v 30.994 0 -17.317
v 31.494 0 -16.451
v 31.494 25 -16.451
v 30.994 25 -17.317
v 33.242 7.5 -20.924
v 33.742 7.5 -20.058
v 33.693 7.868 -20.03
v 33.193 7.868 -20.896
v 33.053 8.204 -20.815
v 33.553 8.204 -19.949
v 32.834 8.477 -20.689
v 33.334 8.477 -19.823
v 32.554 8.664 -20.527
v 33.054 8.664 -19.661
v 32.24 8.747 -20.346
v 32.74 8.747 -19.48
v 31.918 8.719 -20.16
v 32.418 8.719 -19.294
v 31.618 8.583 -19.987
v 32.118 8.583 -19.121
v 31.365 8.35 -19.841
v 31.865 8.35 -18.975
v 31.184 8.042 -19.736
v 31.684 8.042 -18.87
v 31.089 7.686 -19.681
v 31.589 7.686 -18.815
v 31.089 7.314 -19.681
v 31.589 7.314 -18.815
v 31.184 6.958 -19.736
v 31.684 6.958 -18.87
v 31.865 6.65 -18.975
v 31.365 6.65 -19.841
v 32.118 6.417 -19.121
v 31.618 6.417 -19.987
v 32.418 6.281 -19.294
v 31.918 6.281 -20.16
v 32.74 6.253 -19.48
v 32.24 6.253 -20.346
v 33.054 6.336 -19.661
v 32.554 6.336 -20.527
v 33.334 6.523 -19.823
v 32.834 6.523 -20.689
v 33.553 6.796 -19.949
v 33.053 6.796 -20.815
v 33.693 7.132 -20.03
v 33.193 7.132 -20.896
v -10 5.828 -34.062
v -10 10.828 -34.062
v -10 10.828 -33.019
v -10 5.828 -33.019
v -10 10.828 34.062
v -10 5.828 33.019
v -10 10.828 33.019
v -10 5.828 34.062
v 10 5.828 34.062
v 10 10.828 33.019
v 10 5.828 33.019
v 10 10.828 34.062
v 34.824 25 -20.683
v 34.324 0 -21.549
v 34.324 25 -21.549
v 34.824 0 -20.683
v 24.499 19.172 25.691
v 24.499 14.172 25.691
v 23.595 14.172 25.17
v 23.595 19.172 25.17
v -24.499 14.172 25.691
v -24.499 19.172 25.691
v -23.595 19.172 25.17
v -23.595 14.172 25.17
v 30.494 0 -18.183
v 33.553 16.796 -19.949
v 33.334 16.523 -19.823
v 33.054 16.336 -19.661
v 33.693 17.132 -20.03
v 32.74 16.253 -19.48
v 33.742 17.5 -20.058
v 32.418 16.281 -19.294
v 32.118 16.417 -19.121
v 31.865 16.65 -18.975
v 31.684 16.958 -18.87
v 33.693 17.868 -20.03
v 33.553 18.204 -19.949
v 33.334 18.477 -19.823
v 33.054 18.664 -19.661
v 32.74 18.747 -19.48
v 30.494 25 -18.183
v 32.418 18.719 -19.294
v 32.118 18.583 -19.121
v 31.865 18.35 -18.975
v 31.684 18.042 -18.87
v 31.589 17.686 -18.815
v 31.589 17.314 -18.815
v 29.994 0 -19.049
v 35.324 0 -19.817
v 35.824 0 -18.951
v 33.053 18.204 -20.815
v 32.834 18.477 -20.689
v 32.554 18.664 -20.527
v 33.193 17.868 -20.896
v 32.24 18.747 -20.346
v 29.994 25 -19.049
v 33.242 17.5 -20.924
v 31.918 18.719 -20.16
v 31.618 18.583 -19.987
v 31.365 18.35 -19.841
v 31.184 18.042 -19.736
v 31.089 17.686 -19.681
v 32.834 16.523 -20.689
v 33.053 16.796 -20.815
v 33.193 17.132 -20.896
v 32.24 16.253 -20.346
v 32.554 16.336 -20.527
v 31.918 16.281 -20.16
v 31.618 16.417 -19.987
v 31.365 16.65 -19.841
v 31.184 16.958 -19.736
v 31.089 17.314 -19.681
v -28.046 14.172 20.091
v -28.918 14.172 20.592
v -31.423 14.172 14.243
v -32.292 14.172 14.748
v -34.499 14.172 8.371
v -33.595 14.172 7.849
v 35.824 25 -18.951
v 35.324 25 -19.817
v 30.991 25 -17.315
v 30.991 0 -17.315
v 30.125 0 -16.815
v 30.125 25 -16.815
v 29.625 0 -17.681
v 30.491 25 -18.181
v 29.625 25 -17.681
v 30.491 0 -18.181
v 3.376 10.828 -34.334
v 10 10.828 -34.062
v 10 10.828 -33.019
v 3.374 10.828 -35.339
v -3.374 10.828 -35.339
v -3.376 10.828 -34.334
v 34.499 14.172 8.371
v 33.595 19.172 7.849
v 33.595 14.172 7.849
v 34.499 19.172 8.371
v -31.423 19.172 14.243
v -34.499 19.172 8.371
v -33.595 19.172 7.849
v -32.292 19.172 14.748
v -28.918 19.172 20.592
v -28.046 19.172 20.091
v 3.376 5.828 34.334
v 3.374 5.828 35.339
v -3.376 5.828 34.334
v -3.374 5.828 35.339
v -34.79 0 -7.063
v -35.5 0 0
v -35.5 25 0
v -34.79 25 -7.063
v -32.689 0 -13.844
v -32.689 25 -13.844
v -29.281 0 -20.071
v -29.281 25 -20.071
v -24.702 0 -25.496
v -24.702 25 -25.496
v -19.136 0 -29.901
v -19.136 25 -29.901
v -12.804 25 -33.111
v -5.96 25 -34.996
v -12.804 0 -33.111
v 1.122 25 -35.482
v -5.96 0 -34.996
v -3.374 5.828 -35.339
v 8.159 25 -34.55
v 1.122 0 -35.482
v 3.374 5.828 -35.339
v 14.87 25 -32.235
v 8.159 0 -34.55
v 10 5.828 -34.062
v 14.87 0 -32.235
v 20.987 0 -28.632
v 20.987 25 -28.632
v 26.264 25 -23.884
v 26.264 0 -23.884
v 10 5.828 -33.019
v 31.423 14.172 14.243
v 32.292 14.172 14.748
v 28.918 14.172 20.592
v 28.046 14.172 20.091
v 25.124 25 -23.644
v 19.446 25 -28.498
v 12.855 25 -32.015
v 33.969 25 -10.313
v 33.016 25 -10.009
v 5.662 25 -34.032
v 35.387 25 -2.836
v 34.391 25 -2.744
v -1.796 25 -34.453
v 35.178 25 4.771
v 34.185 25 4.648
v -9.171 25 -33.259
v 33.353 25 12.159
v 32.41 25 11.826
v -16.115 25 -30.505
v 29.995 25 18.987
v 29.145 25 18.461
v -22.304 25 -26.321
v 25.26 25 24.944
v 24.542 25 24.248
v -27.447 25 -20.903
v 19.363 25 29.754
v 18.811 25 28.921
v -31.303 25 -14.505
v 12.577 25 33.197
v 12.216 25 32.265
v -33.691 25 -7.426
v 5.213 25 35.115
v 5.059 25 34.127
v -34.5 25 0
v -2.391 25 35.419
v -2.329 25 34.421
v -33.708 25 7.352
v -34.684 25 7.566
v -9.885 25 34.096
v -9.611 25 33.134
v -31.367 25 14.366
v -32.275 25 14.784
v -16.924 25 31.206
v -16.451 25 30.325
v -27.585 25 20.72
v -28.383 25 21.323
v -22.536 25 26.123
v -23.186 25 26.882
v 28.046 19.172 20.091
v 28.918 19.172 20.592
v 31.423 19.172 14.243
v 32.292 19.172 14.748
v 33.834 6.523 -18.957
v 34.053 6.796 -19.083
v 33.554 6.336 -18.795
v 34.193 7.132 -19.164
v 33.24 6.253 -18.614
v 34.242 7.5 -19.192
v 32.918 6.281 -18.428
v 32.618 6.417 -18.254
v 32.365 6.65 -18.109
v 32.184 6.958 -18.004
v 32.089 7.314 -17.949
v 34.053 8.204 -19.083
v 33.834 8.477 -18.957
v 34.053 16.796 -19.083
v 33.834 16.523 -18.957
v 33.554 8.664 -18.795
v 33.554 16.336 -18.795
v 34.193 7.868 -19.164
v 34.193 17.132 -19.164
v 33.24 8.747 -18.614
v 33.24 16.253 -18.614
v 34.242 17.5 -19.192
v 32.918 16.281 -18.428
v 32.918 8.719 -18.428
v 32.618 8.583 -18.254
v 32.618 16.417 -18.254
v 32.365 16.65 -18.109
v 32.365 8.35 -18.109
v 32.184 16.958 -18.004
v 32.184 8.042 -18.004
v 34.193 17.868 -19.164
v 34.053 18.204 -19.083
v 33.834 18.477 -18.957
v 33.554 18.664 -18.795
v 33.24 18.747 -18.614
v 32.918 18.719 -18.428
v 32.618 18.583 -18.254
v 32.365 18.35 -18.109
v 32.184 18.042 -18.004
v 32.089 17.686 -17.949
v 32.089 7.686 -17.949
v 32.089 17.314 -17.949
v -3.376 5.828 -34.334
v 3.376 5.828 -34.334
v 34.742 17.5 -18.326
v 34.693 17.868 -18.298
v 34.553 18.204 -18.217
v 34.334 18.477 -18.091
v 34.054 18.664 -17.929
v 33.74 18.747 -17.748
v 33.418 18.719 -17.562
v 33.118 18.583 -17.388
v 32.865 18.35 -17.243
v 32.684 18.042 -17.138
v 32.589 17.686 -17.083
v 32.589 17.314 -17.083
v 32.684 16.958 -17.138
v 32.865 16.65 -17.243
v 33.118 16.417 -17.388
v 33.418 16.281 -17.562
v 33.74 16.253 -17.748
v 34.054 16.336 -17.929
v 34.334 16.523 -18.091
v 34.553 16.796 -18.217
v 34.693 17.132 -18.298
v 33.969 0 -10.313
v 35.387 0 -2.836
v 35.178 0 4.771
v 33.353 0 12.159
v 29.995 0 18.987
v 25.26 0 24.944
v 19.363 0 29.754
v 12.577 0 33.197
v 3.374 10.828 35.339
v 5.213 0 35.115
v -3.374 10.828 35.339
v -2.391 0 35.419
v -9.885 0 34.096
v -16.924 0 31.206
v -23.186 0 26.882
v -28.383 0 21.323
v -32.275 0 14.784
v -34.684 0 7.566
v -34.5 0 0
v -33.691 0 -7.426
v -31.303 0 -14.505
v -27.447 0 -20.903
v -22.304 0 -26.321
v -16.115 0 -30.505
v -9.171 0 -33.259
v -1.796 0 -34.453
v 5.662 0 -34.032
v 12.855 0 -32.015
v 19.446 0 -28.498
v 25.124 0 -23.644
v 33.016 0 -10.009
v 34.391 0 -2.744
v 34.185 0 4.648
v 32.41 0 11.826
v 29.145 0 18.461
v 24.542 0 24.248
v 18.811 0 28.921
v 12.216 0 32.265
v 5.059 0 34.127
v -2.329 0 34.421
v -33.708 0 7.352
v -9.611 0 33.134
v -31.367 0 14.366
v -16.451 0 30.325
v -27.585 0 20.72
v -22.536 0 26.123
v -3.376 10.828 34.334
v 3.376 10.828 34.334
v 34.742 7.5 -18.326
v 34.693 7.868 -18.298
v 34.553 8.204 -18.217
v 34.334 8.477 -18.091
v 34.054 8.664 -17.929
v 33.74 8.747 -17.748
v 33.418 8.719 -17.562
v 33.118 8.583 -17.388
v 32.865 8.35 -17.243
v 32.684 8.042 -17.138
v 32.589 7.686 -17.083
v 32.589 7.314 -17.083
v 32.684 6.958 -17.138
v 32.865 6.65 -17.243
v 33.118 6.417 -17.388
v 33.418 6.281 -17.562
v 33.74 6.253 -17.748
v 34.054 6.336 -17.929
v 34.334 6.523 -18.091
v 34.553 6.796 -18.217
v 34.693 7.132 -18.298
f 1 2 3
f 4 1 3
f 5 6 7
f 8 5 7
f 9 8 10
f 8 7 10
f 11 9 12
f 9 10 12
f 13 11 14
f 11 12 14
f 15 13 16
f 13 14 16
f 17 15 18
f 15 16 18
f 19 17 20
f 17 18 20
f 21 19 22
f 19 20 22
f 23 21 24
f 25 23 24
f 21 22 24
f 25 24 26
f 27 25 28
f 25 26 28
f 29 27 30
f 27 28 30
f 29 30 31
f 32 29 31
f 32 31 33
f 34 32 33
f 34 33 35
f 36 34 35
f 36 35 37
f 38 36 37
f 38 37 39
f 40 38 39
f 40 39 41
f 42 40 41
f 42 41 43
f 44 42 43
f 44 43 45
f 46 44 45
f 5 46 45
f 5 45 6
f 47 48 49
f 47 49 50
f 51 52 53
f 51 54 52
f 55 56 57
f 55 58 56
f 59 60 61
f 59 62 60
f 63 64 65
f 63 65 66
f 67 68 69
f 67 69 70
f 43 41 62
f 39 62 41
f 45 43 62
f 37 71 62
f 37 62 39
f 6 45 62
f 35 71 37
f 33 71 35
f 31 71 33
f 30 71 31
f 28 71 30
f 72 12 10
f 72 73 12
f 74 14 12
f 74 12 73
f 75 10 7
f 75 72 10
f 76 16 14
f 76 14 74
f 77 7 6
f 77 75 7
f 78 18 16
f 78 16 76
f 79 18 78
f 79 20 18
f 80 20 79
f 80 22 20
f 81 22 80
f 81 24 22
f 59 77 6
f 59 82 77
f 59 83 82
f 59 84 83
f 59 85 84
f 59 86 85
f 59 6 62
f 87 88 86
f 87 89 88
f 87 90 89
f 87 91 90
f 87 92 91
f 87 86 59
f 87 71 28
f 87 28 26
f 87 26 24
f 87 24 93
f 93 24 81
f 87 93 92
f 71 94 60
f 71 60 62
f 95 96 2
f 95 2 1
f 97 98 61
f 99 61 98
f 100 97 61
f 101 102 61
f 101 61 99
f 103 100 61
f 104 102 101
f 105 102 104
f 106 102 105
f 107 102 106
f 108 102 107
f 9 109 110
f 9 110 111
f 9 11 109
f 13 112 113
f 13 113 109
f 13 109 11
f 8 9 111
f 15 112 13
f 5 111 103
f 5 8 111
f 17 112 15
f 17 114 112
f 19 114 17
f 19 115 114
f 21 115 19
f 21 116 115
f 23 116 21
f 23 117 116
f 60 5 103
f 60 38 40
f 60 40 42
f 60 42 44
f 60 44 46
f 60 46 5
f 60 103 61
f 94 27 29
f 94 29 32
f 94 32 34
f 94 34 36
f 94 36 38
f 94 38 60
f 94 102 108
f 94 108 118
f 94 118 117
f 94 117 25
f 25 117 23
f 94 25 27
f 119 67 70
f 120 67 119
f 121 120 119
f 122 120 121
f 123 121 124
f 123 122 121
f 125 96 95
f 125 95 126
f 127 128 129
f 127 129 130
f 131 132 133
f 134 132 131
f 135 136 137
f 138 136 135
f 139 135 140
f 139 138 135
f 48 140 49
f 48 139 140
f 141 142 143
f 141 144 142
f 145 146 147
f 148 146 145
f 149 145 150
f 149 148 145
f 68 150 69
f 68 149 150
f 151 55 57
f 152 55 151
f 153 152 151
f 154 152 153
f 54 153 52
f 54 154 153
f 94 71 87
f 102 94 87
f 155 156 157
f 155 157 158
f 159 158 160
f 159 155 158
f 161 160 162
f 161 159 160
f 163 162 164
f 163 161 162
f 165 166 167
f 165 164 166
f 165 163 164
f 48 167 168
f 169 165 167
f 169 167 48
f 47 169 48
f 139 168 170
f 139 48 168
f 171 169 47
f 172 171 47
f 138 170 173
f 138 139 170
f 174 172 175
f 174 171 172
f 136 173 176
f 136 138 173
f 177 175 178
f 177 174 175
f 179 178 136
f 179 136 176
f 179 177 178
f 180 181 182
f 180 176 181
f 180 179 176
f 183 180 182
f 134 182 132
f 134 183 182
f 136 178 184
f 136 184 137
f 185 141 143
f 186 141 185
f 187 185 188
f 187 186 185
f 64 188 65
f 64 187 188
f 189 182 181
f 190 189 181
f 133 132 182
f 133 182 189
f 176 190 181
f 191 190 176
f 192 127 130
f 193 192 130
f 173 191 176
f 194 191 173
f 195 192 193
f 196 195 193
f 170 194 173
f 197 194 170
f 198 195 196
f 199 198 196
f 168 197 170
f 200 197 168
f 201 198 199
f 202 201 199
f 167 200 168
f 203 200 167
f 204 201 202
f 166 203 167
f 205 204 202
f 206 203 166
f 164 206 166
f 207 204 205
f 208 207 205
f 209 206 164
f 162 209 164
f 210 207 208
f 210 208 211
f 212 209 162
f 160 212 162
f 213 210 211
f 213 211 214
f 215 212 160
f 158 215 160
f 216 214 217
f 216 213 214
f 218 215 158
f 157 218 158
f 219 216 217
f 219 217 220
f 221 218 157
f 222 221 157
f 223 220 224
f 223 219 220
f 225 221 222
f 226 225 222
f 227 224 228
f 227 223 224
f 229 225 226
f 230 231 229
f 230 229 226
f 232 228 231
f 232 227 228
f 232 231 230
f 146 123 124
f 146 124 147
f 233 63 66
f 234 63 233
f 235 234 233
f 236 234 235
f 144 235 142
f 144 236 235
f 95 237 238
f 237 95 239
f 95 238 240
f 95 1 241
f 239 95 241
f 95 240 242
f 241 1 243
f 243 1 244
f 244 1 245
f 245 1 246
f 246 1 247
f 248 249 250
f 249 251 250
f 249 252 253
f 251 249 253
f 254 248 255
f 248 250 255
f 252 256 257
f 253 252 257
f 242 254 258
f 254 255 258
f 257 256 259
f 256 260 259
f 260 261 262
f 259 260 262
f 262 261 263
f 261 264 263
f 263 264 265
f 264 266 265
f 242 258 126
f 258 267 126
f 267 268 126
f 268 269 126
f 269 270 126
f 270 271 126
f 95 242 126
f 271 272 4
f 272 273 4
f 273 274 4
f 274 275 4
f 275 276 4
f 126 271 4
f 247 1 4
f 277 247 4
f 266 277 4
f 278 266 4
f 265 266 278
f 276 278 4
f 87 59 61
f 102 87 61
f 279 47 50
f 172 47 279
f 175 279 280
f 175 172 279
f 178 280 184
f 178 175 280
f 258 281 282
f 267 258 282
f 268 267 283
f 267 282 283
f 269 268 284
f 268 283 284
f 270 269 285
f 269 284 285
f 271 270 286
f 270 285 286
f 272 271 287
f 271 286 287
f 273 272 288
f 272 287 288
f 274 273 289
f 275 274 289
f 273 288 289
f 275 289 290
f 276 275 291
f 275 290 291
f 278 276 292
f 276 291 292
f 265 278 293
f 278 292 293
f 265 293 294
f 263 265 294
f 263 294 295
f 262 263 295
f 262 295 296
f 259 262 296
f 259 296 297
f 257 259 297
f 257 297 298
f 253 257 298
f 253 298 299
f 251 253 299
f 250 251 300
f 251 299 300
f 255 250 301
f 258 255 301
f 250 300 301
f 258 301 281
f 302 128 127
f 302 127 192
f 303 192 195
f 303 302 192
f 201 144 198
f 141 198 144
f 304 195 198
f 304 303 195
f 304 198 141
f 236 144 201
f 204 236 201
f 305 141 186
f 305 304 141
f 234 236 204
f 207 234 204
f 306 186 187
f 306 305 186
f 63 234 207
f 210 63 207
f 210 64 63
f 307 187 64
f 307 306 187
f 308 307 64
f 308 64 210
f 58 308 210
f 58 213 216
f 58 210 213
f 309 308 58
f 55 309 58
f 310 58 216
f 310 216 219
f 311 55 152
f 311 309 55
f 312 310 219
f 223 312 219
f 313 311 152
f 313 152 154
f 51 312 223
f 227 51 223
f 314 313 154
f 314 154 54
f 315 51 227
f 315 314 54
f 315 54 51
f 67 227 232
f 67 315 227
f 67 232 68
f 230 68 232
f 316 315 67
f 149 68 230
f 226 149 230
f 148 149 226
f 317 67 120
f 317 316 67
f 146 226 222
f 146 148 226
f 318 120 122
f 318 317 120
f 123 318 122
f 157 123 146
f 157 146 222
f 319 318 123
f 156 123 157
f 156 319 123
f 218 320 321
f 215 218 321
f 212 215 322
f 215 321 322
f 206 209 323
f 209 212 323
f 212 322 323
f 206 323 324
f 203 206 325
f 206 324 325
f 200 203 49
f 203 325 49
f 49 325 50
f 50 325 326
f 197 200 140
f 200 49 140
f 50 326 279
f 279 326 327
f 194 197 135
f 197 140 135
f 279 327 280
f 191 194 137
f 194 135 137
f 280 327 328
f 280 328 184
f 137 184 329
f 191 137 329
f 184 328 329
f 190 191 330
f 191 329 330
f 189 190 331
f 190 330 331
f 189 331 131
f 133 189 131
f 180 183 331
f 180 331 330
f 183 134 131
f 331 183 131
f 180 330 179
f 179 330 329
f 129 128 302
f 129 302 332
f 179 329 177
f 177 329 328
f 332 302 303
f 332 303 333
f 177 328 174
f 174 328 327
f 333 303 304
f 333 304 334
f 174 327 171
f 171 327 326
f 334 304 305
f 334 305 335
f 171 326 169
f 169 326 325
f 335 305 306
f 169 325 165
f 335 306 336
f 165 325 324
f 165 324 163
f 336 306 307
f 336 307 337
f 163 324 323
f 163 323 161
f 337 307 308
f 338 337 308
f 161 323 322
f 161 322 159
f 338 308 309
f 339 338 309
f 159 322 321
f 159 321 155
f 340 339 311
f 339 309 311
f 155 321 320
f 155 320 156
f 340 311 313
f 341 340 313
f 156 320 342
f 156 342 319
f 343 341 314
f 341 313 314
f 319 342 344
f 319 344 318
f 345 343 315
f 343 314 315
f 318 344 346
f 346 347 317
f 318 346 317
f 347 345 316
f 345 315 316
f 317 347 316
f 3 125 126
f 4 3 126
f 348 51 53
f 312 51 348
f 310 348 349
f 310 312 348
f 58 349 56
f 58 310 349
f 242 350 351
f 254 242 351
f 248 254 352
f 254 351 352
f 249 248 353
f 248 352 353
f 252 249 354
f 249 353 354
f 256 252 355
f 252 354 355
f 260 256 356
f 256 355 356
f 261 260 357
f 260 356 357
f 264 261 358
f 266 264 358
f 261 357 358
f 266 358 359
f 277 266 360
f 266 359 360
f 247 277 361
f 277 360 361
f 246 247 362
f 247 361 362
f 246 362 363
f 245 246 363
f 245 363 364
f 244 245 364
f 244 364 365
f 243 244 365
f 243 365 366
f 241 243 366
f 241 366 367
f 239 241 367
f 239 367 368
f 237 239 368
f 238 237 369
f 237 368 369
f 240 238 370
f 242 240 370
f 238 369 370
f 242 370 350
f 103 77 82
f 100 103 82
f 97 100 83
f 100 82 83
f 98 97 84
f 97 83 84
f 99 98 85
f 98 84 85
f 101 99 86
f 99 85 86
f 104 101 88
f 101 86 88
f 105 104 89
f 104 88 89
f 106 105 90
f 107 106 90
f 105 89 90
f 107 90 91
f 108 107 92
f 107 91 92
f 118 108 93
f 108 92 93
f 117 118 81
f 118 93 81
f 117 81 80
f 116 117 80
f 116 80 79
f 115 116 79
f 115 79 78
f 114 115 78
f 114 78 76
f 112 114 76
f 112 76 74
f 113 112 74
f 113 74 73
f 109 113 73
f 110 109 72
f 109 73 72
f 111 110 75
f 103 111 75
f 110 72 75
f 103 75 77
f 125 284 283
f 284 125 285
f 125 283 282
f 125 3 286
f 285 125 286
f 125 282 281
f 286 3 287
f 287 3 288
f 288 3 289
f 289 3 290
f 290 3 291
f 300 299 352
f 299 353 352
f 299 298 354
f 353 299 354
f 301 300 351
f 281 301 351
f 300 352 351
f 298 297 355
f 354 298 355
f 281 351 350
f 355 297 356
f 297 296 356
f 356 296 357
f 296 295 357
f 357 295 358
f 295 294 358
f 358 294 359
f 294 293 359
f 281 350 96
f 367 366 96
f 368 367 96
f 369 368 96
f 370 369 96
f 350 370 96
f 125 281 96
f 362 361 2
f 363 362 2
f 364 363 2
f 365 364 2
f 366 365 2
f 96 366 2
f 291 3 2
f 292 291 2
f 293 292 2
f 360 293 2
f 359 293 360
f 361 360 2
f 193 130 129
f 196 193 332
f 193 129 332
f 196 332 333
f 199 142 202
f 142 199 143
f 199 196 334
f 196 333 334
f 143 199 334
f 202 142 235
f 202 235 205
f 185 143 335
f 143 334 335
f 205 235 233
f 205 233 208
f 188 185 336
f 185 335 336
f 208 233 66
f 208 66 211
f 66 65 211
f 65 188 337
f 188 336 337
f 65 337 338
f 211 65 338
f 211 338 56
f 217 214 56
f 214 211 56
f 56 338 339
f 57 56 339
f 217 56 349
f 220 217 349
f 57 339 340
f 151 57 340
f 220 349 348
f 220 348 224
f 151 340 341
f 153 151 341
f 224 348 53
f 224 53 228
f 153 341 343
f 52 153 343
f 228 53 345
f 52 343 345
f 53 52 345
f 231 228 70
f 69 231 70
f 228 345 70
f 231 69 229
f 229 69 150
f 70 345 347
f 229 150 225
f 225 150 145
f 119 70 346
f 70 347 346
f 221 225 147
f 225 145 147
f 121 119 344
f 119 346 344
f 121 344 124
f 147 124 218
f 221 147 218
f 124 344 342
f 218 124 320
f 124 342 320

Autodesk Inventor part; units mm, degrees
sketch "Sketch1" plane through (0, 0, 0) normal (0, 1, 0) x (-1, 0, 0)
  circle A0 centre (0, 0) radius 34.5
  circle A1 centre (0, 0) radius 35.5
  dimension "d0" = 69
  dimension "d1" = 71
extrude "Extrusion1" add sketch "Sketch1" along normal blind 25
ref_plane "Work Plane1" through (0, 0, 35.5) normal (0, 0, 1) x (1, 0, 0)
ref_plane "Work Plane2" through (0, 0, -35.5) normal (0, 0, 1) x (1, 0, 0)
ref_plane "Work Plane3" through (0, 0, 0) normal (0.866, 0, -0.5) x (0, 1, 0)
ref_plane "Work Plane6" through (30.7439, 0, 17.75) normal (0.866, 0, 0.5) x (0, 1, 0)
ref_plane "Work Plane5" through (0, 0, 0) normal (0.866, 0, 0.5) x (0, 1, 0)
sketch "Sketch3" plane through (0, 0, 35.5) normal (0, 0, 1) x (1, 0, 0)
  line L0 (-10, 10.828) -> (10, 10.828)
  line L1 (10, 10.828) -> (10, 5.828)
  line L2 (10, 5.828) -> (-10, 5.828)
  line L3 (-10, 5.828) -> (-10, 10.828)
  line L4 (-35.5, 0) -> (35.5, 0) projected
  point P0 (0, 0)
  dimension "d6" = 10.828
  dimension "d7" = 5
  dimension "d8" = 10
  dimension "d9" = 20
sketch "Sketch4" plane through (0, 0, -35.5) normal (0, 0, 1) x (1, 0, 0)
  line L0 (-10, 5.828) -> (10, 5.828)
  line L1 (10, 5.828) -> (10, 10.828)
  line L2 (10, 10.828) -> (-10, 10.828)
  line L3 (-10, 10.828) -> (-10, 5.828)
  point P0 (0, 0)
  dimension "d10" = 10.828
  dimension "d11" = 5
  dimension "d12" = 10
  dimension "d13" = 20
ref_plane "Work Plane7" through (-30.7439, 0, 17.75) normal (0.866, 0, -0.5) x (0, 1, 0)
sketch "Sketch5" plane through (-30.7439, 0, 17.75) normal (0.866, 0, -0.5) x (0, 1, 0)
  line L0 (19.172, 10) -> (14.172, 10)
  line L1 (14.172, 10) -> (14.172, -10)
  line L2 (14.172, -10) -> (19.172, -10)
  line L3 (19.172, -10) -> (19.172, 10)
  line L4 (25, -35.5) -> (25, 35.5) projected
  point P0 (0, 0)
  dimension "d14" = 10.828
  dimension "d15" = 5
  dimension "d16" = 10
  dimension "d17" = 20
sketch "Sketch6" plane through (30.7439, 0, 17.75) normal (0.866, 0, 0.5) x (0, 1, 0)
  line L0 (14.172, 10) -> (19.172, 10)
  line L1 (19.172, 10) -> (19.172, -10)
  line L2 (19.172, -10) -> (14.172, -10)
  line L3 (14.172, -10) -> (14.172, 10)
  line L4 (25, -35.5) -> (25, 35.5) projected
  point P0 (0, 0)
  dimension "d18" = 10.828
  dimension "d19" = 5
  dimension "d20" = 20
  dimension "d21" = 10
extrude "Extrusion2" cut sketch "Sketch3" against normal blind 25
extrude "Extrusion3" cut sketch "Sketch6" against normal blind 25
extrude "Extrusion4" cut sketch "Sketch4" along normal blind 25
extrude "Extrusion5" cut sketch "Sketch5" along normal blind 25
ref_plane "Work Plane8" through (30.7439, 0, -17.75) normal (0.866, 0, -0.5) x (0, 1, 0)
sketch "Sketch7" plane through (30.7439, 0, -17.75) normal (0.866, 0, -0.5) x (0, 1, 0)
  line L0 (25, -0.5) -> (0, -0.5)
  line L1 (0, -0.5) -> (0, 0.5)
  line L2 (0, 0.5) -> (25, 0.5)
  line L3 (25, 0.5) -> (25, -0.5)
  line L4 (25, -0.5) -> (0, 0.5) construction
  line L5 (0, -0.5) -> (25, 0.5) construction
  point P0 (0, 0)
  point P1 (12.5, 0)
  dimension "d30" = 25
  dimension "d31" = 1
  dimension "d32" = 0.5
extrude "Extrusion6" cut sketch "Sketch7" against normal blind 25
sketch "Sketch8" plane through (30.7439, 0, -17.75) normal (0.866, 0, -0.5) x (0, 1, 0)
  line L0 (25, 34.5) -> (25, -34.5) projected
  line L1 (0, 0.5) -> (25, 0.5)
  line L2 (25, 0.5) -> (25, 1.5)
  line L3 (25, 1.5) -> (0, 1.5)
  line L4 (0, 1.5) -> (0, 0.5)
  line L5 (0, -0.5) -> (25, -0.5)
  line L6 (25, -0.5) -> (25, -1.5)
  line L7 (25, -1.5) -> (0, -1.5)
  line L8 (0, -1.5) -> (0, -0.5)
  point P0 (0, 0)
  point P1 (25, 0.5)
  dimension "d35" = 1
  dimension "d36" = 1
extrude "Extrusion7" add sketch "Sketch8" along normal blind 5
sketch "Sketch9" plane through (31.4939, 0, -16.451) normal (0.5, 0, 0.866) x (0.866, 0, -0.5)
  circle A0 centre (2.5, 7.5) radius 1.25
  circle A1 centre (2.5, 17.5) radius 1.25
  line L0 (0, 0) -> (5, 0) projected
  line L1 (0, 25) -> (5, 25) projected
  line L2 (5, 25) -> (5, 0) projected
  point P0 (-35.5, 0)
  dimension "d39" = 2.5
  dimension "d40" = 2.5
  dimension "d44" = 2.5
  dimension "d45" = 2.5
  dimension "d46" = 7.5
  dimension "d47" = 7.5
extrude "Extrusion8" cut sketch "Sketch9" against normal blind 5
equation "\"d9\" = 2 * d8"
equation "\"d10\" = d6"
equation "\"d12\" = d8"
equation "\"d13\" = 2 * d12"
equation "\"d14\" = d6"
equation "\"d15\" = d7"
equation "\"d17\" = 2 * d16"
equation "\"d18\" = d6"
equation "\"d19\" = d7"
equation "\"d20\" = d17"
equation "\"d21\" = d8"
equation "\"d32\" = 0.5 * d31"
properties part number "ring"
